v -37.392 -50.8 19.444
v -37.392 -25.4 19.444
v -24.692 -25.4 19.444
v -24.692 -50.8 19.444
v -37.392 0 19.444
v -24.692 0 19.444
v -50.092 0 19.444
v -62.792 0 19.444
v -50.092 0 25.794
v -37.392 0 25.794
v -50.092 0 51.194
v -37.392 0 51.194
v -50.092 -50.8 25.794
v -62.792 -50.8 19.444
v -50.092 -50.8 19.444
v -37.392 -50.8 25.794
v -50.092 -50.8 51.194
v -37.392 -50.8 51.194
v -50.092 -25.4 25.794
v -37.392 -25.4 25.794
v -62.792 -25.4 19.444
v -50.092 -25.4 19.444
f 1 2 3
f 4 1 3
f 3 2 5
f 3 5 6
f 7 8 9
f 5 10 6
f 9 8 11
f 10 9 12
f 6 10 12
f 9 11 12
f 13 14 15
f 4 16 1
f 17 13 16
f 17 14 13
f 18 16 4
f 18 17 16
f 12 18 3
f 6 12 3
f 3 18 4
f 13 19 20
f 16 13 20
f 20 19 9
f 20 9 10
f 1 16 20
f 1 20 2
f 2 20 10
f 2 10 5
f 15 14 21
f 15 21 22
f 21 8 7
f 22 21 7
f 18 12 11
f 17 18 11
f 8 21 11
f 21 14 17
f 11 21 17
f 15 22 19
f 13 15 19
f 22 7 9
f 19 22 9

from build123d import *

# Parameters (mm, degrees)
F1_DEPTH = 25.4
F2_DEPTH = 25.4
F4_DEPTH = 50.8
F6_DEPTH = 50.8


# Not quite as in the source:
# - a feature names something its author has since deleted; it is built from what else it names


with BuildPart() as f1:
    # F0 (on Front) → F1 (new body)
    with BuildSketch(Plane.XZ):
        Polygon((-24.6924351323, 51.1944131529), (-62.7924351323, 51.1944131529), (-62.7924351323, 19.4444131529), (-50.0924351323, 19.4444131529), (-50.0924351323, 25.7944131529), (-37.3924351323, 25.7944131529), (-37.3924351323, 19.4444131529), (-24.6924351323, 19.4444131529), align=None)
    extrude(amount=F1_DEPTH)

    # F0 (on Front) + F1_face (on face) → F2 (join)
    with BuildSketch(Plane.XZ):
        Polygon((-24.6924351323, 51.1944131529), (-62.7924351323, 51.1944131529), (-62.7924351323, 19.4444131529), (-50.0924351323, 19.4444131529), (-50.0924351323, 25.7944131529), (-37.3924351323, 25.7944131529), (-37.3924351323, 19.4444131529), (-24.6924351323, 19.4444131529), align=None)
    with BuildSketch(Plane(origin=(-43.7424351323, -25.4, 36.2265560101), x_dir=(1, 0, 0), z_dir=(0, -1, 0))):
        Polygon((19.05, 14.9678571429), (-19.05, 14.9678571429), (-19.05, -16.7821428571), (-6.35, -16.7821428571), (-6.35, -10.4321428571), (6.35, -10.4321428571), (6.35, -16.7821428571), (19.05, -16.7821428571), align=None)
    extrude(amount=F2_DEPTH)

    # F3 (on face) → F4 (cut)
    with BuildSketch(Plane.XZ.offset(50.8)):
        Polygon((-62.7924351323, 19.4444131529), (-50.0924351323, 51.1944131529), (-62.7924351323, 51.1944131529), align=None)
    extrude(amount=-F4_DEPTH, mode=Mode.SUBTRACT)

    # F5 (on face) → F6 (cut)
    with BuildSketch(Plane.XZ.offset(50.8)):
        Polygon((-24.6924351323, 51.1944131529), (-37.3924351323, 51.1944131529), (-24.6924351323, 19.4444131529), align=None)
    extrude(amount=-F6_DEPTH, mode=Mode.SUBTRACT)


solid = f1.part
